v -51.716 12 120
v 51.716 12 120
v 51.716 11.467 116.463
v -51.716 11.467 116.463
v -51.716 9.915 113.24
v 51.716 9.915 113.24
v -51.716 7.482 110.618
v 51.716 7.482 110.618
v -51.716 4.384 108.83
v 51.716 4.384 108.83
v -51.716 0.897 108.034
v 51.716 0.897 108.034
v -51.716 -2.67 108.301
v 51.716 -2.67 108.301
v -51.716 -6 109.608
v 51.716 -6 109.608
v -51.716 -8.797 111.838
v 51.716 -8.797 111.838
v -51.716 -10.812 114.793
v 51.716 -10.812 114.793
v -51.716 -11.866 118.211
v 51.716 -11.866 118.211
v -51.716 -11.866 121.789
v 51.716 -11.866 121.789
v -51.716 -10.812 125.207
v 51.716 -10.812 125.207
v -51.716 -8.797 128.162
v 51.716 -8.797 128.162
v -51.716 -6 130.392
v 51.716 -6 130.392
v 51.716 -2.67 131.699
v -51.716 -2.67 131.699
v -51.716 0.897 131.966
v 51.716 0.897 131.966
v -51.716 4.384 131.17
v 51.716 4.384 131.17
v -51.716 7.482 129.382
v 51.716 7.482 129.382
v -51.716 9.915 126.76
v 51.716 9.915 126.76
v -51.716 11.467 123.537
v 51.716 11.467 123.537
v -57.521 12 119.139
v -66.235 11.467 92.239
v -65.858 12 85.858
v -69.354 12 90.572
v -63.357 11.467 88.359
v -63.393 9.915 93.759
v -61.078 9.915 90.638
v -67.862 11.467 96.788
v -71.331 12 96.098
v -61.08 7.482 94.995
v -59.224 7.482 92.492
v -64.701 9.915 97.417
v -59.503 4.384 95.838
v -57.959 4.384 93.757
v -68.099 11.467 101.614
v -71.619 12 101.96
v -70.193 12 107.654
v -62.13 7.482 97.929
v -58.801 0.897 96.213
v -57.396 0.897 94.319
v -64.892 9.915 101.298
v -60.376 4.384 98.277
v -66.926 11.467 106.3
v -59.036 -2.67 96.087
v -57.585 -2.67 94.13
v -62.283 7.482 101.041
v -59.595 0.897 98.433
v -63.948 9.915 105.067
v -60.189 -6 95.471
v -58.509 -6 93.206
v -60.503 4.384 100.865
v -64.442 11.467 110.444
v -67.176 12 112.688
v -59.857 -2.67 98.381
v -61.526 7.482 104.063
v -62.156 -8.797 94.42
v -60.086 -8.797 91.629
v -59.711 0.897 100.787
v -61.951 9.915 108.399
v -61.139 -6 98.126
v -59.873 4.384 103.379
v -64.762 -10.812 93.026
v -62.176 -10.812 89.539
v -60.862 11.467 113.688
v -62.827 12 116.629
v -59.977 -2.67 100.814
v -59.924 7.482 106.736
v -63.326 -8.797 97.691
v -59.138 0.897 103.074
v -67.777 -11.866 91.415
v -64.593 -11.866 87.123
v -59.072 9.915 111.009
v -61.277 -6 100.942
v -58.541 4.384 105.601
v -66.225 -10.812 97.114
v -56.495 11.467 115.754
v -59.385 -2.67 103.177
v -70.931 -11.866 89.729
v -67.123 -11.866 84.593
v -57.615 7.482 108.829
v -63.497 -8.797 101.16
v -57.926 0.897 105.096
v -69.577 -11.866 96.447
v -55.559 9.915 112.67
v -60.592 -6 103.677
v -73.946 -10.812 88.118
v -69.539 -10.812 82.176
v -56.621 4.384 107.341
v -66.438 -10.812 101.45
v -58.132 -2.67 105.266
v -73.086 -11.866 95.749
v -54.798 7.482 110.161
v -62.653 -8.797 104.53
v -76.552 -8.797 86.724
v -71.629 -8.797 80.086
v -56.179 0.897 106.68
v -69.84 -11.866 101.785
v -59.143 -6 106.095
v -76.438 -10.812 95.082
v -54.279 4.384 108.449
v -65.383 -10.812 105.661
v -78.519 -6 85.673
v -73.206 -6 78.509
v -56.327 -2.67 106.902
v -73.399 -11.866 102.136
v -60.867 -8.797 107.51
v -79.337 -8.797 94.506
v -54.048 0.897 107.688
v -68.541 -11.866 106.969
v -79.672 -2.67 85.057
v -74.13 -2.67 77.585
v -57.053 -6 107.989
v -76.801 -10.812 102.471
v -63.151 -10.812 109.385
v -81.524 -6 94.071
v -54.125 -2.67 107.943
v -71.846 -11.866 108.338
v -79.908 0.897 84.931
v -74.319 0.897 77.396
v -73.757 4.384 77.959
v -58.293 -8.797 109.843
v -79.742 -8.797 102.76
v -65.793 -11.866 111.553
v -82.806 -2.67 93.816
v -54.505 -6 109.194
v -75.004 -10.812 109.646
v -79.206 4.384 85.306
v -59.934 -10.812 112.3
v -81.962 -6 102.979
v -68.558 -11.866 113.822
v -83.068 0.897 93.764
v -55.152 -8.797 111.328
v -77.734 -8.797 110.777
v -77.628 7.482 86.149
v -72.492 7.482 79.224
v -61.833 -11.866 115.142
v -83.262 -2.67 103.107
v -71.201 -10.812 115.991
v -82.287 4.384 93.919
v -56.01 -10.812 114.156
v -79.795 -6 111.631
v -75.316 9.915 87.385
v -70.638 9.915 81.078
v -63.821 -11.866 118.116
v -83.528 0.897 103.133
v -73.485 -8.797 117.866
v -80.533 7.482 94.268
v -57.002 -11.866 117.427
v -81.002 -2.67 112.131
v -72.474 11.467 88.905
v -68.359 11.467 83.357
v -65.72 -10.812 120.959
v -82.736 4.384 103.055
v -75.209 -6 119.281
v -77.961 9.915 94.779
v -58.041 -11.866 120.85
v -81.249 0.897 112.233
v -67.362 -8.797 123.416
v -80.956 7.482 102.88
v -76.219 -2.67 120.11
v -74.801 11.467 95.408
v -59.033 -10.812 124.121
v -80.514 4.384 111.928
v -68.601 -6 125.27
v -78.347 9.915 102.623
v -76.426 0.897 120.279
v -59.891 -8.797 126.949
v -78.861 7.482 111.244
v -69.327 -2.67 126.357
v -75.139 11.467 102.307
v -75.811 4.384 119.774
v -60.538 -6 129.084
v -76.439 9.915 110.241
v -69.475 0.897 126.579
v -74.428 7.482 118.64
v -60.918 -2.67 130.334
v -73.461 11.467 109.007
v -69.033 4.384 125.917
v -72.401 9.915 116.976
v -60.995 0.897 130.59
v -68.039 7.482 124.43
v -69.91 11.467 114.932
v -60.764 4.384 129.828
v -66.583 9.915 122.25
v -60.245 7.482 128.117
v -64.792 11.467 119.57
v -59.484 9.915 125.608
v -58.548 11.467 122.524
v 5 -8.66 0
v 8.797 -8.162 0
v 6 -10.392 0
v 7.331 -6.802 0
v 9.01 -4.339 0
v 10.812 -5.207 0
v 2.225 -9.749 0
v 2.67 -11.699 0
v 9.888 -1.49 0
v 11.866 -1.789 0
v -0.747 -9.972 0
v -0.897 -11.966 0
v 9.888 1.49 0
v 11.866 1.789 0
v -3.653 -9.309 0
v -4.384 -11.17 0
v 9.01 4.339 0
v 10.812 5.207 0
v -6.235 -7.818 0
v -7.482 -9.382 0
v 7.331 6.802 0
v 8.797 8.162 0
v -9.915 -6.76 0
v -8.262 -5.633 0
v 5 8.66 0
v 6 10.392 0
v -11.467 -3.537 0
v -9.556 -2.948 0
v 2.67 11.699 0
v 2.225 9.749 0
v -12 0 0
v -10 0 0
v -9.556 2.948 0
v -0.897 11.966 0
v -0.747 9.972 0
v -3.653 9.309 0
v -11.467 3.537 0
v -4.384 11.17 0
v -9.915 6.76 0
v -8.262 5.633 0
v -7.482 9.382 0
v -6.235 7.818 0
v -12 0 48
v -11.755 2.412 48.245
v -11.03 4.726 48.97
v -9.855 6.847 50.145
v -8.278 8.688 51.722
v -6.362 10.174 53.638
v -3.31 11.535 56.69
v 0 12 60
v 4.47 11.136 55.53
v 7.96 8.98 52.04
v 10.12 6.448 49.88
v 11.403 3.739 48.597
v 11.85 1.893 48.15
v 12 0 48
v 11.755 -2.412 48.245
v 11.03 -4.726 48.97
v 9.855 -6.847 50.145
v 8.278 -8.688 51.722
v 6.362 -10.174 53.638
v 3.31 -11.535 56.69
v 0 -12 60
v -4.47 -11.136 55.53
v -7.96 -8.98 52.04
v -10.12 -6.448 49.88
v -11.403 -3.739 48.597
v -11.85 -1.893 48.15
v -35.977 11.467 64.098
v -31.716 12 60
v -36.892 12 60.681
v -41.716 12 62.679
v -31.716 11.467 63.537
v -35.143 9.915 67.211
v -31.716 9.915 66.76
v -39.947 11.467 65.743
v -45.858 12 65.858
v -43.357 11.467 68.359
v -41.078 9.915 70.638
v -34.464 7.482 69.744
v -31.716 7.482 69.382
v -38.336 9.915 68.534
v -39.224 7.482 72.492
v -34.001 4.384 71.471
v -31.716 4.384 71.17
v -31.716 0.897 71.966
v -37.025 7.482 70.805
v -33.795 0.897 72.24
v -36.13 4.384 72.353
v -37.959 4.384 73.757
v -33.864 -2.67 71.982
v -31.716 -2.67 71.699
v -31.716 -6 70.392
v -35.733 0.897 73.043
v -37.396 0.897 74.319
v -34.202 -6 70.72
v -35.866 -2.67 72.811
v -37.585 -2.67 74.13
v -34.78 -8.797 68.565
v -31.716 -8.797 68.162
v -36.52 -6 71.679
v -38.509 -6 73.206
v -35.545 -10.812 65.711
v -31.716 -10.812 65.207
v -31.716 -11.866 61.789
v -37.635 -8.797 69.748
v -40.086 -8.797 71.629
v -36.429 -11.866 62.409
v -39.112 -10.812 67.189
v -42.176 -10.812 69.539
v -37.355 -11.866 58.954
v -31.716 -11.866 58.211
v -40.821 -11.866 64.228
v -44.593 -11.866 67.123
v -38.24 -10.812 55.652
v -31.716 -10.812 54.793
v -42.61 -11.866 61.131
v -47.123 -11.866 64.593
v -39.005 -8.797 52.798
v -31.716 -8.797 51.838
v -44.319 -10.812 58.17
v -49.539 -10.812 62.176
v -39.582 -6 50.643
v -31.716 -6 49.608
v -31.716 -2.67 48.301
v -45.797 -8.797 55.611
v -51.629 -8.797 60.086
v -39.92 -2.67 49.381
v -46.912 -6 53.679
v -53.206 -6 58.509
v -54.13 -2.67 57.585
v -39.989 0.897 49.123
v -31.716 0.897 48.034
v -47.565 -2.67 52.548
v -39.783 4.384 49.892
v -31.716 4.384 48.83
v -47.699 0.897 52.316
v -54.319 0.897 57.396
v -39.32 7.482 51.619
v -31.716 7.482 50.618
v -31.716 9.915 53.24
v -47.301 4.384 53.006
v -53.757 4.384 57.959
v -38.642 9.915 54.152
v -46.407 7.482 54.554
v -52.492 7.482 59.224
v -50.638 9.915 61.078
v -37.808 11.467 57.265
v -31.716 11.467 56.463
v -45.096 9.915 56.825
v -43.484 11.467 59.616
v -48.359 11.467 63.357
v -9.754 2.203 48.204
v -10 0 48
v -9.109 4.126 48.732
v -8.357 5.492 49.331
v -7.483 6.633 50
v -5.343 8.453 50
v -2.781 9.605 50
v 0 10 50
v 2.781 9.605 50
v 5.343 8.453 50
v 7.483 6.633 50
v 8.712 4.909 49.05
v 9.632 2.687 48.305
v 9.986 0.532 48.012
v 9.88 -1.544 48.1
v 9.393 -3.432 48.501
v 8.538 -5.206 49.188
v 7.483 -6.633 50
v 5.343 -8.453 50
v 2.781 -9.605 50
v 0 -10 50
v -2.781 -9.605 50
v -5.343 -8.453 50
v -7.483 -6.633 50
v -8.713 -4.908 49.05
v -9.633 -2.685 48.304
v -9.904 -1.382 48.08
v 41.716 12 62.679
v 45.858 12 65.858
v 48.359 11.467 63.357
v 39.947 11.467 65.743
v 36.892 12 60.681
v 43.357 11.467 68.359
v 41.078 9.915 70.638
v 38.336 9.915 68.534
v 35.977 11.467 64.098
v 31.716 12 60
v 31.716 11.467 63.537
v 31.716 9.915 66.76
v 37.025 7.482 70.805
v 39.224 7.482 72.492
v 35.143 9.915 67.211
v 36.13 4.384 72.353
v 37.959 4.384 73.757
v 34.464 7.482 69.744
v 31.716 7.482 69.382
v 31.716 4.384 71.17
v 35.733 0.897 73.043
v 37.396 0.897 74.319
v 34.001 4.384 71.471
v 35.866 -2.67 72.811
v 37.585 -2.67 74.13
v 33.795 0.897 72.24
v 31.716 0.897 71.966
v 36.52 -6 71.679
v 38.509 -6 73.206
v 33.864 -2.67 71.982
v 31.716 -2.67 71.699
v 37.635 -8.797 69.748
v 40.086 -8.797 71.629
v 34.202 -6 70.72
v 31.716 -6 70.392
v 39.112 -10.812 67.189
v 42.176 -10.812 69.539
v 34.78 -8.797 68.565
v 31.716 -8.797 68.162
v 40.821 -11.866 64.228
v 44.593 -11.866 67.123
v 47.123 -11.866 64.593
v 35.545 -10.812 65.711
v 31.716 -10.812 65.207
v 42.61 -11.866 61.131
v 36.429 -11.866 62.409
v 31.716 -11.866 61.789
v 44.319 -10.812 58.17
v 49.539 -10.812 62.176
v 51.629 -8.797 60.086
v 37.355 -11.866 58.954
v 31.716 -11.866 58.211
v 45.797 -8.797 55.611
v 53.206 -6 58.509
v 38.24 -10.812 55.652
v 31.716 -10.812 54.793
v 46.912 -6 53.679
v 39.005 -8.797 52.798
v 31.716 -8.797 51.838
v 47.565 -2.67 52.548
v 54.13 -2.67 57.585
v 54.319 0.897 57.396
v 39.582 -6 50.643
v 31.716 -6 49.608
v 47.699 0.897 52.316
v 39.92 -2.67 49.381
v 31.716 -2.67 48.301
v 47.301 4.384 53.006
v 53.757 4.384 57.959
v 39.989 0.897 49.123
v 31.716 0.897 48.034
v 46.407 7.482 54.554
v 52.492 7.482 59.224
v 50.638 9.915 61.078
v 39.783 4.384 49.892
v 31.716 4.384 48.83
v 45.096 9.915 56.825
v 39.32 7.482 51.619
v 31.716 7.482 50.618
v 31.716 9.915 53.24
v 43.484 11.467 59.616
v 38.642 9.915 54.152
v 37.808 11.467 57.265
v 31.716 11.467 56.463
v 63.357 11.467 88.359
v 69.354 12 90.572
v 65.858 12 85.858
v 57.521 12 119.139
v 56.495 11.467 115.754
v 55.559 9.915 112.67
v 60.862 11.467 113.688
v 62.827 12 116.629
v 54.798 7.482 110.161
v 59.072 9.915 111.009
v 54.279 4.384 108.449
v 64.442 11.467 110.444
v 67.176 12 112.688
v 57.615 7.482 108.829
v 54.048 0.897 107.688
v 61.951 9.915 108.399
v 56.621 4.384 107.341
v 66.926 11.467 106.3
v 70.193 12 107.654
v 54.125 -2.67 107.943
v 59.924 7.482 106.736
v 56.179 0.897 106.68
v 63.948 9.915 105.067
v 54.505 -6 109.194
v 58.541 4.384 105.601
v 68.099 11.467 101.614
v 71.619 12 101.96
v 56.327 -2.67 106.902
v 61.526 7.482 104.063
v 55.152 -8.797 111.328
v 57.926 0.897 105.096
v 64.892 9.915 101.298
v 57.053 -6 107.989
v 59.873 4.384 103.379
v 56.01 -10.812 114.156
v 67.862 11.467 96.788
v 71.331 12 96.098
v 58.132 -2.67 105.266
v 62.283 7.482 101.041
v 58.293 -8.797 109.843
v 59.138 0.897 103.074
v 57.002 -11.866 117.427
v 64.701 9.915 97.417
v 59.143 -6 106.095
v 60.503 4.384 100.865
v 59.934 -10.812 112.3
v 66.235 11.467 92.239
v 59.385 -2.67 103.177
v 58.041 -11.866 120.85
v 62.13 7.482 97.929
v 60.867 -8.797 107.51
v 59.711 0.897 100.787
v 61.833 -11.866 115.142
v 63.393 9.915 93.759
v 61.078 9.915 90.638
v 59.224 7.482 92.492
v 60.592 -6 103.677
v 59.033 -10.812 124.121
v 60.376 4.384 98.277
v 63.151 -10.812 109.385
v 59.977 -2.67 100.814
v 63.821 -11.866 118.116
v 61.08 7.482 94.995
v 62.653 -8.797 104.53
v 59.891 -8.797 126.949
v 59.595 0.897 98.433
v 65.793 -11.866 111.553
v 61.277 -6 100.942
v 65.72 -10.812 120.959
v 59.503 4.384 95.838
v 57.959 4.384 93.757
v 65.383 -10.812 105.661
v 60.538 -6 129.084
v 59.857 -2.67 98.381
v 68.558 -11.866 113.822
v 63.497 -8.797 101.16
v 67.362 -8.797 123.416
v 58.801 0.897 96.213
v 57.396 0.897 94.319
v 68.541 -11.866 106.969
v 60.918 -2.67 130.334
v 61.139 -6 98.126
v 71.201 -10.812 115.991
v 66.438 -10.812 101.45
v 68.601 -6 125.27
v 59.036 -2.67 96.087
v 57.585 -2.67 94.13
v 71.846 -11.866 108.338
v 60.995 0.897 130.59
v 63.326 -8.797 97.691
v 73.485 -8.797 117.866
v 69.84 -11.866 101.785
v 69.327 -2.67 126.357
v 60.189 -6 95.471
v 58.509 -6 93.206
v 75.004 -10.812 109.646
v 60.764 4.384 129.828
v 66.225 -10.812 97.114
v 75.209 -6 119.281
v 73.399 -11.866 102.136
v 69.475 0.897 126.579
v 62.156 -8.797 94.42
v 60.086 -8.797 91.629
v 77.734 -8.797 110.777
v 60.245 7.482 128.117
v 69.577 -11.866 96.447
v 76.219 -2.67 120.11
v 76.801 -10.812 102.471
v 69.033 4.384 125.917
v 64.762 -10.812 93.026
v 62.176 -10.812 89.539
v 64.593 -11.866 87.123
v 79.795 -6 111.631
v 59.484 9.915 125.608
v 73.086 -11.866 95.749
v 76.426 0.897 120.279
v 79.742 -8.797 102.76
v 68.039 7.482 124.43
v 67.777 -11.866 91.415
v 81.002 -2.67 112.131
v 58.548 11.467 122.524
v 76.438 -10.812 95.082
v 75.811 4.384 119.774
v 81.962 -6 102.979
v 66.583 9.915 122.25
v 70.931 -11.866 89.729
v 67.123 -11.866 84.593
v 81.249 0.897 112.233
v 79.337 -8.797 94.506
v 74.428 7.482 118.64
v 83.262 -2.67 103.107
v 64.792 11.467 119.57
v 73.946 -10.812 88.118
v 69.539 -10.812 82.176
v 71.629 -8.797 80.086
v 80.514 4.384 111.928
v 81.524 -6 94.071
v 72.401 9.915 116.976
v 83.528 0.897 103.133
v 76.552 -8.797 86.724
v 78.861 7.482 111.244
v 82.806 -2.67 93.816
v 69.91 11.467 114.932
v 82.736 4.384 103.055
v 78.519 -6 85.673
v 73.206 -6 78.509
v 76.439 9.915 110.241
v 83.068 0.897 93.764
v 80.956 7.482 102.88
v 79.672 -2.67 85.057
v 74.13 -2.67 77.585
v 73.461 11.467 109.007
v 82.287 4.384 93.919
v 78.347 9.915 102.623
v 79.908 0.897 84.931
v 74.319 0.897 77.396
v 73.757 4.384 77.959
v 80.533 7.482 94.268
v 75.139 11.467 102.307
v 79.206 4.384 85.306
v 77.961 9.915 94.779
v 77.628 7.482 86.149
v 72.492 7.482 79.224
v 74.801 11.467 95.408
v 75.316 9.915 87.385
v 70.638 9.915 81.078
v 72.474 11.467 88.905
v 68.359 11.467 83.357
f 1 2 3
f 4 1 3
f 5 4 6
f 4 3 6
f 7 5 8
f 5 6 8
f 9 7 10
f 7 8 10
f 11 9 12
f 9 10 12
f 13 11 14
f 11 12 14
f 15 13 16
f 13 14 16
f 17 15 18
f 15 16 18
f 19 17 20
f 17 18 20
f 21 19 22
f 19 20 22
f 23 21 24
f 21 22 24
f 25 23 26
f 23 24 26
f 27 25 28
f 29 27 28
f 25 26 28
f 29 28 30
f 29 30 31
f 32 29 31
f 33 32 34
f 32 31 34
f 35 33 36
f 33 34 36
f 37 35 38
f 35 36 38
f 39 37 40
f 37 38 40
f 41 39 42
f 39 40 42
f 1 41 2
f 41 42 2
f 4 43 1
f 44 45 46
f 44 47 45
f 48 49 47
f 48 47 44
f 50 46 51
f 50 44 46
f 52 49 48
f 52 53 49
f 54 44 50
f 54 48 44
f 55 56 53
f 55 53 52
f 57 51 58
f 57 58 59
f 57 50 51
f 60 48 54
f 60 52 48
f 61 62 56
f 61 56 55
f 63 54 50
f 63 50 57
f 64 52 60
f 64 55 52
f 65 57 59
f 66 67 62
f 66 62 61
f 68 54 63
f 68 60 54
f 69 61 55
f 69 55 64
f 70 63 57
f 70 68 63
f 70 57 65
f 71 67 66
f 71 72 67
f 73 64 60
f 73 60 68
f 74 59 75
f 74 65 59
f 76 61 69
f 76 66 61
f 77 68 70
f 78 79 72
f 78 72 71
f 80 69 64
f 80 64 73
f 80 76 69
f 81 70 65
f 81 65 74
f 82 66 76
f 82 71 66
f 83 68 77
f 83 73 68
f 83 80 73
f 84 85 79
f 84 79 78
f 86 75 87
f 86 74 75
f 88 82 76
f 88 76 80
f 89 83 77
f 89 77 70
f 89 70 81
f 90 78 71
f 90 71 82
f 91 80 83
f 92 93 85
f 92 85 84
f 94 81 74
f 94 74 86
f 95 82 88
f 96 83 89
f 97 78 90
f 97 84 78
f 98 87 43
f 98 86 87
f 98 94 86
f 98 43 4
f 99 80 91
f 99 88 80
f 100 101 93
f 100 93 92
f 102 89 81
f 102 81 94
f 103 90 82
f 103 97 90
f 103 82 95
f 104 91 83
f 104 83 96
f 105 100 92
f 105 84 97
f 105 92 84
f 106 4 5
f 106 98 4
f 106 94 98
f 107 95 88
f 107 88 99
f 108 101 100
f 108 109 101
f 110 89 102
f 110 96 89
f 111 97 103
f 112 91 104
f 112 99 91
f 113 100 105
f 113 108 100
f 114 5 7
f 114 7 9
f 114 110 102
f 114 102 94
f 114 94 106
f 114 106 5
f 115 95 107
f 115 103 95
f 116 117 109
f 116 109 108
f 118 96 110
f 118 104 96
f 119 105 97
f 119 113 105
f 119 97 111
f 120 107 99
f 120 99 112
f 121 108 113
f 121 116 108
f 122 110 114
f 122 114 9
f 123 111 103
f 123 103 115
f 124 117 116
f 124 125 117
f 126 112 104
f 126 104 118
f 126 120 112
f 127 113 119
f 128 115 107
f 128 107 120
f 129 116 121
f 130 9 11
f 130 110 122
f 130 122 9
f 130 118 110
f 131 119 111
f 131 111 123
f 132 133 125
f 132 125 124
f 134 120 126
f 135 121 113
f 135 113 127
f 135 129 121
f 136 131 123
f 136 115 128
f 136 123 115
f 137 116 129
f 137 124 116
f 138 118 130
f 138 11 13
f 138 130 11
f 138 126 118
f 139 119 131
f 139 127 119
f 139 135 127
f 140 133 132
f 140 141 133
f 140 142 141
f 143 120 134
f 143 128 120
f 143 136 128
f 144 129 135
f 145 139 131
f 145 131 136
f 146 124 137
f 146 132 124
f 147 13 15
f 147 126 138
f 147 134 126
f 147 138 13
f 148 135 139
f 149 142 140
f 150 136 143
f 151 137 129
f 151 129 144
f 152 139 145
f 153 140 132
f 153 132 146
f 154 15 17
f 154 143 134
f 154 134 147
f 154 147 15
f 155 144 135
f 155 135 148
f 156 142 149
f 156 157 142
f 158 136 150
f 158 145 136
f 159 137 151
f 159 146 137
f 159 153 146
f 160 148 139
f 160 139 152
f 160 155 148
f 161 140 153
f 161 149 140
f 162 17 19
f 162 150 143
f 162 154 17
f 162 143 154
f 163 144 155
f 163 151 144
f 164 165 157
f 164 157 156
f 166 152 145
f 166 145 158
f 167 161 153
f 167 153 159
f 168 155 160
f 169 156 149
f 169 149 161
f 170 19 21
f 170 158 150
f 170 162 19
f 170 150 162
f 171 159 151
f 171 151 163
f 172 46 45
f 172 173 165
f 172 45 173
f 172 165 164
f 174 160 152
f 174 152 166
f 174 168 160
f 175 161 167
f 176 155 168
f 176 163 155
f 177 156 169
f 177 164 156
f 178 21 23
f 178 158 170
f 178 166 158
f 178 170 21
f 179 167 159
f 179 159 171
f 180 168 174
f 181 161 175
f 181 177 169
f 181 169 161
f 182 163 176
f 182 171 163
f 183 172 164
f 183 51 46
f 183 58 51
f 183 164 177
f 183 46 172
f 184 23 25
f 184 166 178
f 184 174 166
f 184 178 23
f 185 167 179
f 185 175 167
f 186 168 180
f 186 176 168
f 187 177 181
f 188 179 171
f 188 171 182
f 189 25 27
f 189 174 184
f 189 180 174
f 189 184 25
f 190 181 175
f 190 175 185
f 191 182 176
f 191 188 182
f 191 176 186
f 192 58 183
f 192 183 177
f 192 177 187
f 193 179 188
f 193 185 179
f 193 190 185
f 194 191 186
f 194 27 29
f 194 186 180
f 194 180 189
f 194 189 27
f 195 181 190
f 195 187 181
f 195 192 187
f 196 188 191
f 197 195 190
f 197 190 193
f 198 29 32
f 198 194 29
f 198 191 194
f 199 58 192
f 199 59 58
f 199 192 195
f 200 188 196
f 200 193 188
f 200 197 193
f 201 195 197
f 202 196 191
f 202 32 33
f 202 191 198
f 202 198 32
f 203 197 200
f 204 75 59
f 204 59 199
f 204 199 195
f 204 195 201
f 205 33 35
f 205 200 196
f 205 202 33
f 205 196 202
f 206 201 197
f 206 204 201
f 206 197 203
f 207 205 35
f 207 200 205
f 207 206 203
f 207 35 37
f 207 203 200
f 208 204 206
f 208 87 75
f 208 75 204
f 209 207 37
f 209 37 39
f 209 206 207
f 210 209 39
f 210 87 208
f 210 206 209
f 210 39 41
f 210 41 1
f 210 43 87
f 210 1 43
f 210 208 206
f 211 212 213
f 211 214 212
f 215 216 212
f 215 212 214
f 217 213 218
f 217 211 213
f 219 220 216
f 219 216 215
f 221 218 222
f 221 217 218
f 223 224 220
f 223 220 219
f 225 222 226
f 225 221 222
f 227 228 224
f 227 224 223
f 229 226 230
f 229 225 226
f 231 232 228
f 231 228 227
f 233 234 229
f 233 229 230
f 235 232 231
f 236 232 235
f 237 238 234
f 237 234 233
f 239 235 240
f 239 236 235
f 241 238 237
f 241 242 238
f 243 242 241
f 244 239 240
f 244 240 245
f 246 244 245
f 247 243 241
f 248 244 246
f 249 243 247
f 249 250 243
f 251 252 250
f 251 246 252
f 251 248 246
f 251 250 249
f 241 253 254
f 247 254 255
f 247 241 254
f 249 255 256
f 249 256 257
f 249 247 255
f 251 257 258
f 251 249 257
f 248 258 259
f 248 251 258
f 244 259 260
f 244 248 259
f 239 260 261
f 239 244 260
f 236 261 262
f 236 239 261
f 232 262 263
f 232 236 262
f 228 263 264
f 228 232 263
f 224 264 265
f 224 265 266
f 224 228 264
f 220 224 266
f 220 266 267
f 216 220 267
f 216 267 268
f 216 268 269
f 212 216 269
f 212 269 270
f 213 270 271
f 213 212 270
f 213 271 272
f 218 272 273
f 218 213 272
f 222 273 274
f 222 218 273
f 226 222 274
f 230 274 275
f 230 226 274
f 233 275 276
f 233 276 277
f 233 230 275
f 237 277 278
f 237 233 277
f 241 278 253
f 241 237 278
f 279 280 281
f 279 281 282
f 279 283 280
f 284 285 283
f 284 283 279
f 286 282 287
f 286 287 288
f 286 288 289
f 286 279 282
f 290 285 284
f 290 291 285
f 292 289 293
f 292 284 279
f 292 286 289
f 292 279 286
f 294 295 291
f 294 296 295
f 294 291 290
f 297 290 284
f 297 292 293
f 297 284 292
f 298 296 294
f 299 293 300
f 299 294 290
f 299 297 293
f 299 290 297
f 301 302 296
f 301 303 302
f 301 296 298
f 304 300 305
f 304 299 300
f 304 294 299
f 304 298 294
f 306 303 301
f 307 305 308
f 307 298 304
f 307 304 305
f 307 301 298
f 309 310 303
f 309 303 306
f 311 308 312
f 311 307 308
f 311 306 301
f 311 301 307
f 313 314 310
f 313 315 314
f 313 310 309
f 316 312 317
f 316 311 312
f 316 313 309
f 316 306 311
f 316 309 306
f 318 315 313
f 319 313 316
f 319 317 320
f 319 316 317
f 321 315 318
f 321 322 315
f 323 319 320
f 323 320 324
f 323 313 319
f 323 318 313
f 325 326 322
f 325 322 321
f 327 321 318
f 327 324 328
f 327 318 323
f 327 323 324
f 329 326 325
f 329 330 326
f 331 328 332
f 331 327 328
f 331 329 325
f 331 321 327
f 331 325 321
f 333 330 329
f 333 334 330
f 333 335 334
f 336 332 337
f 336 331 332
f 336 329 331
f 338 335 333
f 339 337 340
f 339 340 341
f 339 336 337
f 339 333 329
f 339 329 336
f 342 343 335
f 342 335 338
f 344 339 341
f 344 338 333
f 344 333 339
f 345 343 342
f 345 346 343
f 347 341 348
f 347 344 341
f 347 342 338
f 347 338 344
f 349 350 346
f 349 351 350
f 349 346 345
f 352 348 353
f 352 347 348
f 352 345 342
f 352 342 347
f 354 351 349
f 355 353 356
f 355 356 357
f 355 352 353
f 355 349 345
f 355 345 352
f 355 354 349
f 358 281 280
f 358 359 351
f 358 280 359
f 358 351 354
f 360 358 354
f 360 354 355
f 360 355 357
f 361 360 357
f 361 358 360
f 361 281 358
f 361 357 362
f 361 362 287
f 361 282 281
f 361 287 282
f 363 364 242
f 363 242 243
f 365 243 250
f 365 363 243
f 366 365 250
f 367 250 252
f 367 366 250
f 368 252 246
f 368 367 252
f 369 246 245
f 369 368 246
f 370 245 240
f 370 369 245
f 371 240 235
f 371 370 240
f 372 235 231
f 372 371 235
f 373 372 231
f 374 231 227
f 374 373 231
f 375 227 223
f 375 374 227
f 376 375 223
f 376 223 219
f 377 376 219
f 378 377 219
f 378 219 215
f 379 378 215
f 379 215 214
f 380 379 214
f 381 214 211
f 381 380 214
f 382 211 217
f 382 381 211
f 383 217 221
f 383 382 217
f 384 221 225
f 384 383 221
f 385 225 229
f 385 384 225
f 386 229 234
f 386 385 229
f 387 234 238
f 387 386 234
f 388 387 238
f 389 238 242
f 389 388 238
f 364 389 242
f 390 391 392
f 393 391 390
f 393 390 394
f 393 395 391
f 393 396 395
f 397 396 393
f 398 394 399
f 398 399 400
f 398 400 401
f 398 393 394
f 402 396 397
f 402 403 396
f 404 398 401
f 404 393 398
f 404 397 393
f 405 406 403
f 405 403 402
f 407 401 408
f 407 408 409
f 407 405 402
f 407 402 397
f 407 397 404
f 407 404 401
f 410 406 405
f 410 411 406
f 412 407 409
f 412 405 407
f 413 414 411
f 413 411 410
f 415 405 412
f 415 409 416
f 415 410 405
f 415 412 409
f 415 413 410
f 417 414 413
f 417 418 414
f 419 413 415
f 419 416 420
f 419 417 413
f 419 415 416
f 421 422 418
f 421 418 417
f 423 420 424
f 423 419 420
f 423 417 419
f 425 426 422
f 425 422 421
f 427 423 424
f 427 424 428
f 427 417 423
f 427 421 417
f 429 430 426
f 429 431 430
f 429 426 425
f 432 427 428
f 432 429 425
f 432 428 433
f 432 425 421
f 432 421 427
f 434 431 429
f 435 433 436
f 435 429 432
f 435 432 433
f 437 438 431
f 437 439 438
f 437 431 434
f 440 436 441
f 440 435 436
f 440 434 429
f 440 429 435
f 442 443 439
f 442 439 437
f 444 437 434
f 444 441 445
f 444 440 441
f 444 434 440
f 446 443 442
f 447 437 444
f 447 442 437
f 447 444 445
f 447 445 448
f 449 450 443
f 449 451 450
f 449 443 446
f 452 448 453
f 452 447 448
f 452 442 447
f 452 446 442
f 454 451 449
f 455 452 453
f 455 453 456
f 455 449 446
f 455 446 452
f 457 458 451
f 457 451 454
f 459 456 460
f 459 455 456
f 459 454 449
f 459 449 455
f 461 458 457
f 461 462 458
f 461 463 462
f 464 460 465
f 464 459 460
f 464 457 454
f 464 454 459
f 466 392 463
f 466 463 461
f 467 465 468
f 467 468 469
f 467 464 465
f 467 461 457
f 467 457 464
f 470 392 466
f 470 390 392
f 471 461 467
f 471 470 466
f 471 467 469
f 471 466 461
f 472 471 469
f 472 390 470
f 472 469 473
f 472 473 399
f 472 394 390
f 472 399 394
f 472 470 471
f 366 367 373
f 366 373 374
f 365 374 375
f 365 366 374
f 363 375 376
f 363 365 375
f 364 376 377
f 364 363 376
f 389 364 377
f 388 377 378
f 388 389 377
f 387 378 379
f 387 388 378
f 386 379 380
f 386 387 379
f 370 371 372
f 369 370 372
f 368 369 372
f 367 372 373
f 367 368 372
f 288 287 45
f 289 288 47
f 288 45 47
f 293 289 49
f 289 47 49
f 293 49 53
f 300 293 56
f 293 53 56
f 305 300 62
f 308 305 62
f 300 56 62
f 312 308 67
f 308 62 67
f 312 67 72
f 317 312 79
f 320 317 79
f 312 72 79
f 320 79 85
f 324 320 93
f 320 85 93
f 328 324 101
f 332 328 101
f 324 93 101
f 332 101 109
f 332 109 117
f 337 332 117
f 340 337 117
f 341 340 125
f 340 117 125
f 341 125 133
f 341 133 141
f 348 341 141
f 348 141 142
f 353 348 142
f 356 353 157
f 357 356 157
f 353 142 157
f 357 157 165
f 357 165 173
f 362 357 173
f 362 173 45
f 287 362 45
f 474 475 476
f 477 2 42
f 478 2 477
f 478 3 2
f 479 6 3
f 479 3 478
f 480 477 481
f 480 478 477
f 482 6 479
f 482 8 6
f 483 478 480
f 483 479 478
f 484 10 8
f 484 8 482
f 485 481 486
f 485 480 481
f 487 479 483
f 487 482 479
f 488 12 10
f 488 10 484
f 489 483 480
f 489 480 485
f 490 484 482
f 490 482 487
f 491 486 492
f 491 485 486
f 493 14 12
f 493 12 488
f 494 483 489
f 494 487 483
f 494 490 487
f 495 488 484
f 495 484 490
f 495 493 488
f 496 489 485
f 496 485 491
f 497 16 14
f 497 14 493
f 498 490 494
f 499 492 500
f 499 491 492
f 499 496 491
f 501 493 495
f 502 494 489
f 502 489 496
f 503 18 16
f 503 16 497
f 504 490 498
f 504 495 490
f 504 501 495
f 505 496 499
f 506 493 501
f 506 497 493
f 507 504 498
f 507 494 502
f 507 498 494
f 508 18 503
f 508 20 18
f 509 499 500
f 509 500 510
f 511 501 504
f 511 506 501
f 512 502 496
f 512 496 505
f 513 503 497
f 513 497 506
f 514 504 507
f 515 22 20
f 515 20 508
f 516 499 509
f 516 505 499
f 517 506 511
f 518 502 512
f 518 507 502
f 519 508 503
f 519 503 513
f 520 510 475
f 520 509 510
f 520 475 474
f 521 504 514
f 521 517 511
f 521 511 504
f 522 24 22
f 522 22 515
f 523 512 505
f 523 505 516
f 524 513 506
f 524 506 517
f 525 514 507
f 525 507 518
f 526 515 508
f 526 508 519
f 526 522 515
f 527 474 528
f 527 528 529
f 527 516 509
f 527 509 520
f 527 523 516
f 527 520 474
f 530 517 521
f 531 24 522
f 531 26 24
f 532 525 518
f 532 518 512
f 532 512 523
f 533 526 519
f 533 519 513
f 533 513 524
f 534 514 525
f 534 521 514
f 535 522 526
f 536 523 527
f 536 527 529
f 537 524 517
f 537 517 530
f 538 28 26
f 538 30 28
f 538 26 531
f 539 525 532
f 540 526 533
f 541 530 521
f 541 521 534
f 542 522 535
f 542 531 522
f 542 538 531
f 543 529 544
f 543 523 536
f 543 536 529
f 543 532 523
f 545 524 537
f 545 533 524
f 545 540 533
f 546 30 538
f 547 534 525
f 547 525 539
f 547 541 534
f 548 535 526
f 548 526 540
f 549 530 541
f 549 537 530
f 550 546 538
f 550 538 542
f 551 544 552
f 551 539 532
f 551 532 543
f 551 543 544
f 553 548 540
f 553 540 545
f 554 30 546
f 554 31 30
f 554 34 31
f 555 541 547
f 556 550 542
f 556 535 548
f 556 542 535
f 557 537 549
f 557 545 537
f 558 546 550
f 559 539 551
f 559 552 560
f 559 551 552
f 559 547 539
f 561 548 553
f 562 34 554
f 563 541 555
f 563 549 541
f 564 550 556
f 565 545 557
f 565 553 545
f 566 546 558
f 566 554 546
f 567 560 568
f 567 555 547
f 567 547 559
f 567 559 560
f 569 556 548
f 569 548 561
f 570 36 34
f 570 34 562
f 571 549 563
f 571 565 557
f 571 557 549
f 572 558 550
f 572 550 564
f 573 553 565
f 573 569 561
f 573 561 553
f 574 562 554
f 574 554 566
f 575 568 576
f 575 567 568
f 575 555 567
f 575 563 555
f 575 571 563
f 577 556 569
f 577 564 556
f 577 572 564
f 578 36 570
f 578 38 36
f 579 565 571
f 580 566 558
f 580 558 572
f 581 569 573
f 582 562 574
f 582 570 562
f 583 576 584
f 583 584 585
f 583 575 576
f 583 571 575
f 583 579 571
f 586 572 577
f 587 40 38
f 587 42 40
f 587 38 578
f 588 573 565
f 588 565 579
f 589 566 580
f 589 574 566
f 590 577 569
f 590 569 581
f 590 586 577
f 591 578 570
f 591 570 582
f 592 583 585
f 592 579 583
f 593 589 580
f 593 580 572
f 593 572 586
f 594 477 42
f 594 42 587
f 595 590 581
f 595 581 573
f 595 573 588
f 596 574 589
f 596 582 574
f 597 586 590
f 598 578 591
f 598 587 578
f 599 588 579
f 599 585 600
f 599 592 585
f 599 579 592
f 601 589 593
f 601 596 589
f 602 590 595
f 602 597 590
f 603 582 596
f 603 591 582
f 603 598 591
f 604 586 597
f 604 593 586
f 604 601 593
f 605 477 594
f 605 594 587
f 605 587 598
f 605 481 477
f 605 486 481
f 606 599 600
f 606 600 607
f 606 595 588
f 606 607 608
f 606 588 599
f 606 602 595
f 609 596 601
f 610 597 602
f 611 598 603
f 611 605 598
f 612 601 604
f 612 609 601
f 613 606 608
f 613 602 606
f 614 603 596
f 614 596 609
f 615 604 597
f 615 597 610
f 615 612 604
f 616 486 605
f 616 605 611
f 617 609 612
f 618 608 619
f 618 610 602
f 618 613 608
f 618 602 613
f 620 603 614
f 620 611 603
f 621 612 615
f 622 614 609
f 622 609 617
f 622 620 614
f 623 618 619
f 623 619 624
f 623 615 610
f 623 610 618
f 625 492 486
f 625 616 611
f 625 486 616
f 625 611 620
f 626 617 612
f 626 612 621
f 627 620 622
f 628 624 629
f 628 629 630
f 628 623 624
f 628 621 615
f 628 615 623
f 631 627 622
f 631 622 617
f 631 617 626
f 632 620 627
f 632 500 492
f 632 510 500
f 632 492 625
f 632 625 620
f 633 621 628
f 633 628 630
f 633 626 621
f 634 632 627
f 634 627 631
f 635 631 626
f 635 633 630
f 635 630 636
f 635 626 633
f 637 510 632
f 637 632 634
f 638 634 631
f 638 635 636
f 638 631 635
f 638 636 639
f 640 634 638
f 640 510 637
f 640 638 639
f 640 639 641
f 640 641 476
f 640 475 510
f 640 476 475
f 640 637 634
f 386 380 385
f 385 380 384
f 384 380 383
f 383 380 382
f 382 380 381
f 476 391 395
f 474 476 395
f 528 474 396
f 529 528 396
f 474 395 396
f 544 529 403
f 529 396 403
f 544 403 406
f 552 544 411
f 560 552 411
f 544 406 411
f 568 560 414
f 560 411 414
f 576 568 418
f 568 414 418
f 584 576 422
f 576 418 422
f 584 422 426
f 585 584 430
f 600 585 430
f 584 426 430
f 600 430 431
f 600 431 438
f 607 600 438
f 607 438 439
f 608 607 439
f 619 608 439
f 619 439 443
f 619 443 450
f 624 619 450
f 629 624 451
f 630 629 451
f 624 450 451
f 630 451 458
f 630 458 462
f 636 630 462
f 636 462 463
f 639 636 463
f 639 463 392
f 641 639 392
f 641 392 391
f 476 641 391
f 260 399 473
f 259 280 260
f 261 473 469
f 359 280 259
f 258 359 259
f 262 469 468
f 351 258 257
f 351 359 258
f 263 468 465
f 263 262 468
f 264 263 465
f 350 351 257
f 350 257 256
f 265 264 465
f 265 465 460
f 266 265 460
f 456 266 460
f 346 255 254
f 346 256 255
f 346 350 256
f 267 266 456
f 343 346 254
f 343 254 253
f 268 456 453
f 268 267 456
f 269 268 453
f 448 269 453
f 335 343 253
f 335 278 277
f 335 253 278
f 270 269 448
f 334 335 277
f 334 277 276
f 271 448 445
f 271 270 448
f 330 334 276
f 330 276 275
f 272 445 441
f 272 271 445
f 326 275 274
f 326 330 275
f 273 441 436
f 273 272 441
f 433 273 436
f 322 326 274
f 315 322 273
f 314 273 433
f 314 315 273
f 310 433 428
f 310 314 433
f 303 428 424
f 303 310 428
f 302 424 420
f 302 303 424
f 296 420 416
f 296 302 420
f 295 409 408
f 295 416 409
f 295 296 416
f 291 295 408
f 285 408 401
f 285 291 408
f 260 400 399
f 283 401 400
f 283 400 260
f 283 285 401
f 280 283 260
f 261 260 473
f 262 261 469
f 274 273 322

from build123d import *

# Parameters (mm, degrees)
F3_R = 12


with BuildPart() as f1:
    # F0 (on Front) → F1 (revolve)
    with BuildSketch(Plane.XZ):
        Polygon((-12, 0), (-10, 0), (-10, 50), (0, 50), (0, 60), (-12, 60), align=None)
    revolve(axis=Axis((0, 0, 25), (0, 0, -1)))

    # F4: sweep along a path in F2
    with BuildLine(Plane.XZ) as f4_path:
        Line((0, 60), (-31.715729, 60))
        ThreePointArc((-31.715729, 60), (-39.369397, 61.522409), (-45.857864, 65.857864))
        Line((-45.857864, 65.857864), (-65.857864, 85.857864))
        ThreePointArc((-65.857864, 85.857864), (-70.193319, 107.653669), (-51.715729, 120))
        Line((-51.715729, 120), (51.715729, 120))
        ThreePointArc((51.715729, 120), (70.193319, 107.653669), (65.857864, 85.857864))
        Line((65.857864, 85.857864), (45.857864, 65.857864))
        ThreePointArc((45.857864, 65.857864), (39.369397, 61.522409), (31.715729, 60))
        Line((31.715729, 60), (0, 60))
    # F3 (on Right) → F4 (sweep)
    with BuildSketch(Plane.YZ):
        with Locations((0, 60)):
            Circle(F3_R)
    sweep(path=f4_path.line)


solid = f1.part
